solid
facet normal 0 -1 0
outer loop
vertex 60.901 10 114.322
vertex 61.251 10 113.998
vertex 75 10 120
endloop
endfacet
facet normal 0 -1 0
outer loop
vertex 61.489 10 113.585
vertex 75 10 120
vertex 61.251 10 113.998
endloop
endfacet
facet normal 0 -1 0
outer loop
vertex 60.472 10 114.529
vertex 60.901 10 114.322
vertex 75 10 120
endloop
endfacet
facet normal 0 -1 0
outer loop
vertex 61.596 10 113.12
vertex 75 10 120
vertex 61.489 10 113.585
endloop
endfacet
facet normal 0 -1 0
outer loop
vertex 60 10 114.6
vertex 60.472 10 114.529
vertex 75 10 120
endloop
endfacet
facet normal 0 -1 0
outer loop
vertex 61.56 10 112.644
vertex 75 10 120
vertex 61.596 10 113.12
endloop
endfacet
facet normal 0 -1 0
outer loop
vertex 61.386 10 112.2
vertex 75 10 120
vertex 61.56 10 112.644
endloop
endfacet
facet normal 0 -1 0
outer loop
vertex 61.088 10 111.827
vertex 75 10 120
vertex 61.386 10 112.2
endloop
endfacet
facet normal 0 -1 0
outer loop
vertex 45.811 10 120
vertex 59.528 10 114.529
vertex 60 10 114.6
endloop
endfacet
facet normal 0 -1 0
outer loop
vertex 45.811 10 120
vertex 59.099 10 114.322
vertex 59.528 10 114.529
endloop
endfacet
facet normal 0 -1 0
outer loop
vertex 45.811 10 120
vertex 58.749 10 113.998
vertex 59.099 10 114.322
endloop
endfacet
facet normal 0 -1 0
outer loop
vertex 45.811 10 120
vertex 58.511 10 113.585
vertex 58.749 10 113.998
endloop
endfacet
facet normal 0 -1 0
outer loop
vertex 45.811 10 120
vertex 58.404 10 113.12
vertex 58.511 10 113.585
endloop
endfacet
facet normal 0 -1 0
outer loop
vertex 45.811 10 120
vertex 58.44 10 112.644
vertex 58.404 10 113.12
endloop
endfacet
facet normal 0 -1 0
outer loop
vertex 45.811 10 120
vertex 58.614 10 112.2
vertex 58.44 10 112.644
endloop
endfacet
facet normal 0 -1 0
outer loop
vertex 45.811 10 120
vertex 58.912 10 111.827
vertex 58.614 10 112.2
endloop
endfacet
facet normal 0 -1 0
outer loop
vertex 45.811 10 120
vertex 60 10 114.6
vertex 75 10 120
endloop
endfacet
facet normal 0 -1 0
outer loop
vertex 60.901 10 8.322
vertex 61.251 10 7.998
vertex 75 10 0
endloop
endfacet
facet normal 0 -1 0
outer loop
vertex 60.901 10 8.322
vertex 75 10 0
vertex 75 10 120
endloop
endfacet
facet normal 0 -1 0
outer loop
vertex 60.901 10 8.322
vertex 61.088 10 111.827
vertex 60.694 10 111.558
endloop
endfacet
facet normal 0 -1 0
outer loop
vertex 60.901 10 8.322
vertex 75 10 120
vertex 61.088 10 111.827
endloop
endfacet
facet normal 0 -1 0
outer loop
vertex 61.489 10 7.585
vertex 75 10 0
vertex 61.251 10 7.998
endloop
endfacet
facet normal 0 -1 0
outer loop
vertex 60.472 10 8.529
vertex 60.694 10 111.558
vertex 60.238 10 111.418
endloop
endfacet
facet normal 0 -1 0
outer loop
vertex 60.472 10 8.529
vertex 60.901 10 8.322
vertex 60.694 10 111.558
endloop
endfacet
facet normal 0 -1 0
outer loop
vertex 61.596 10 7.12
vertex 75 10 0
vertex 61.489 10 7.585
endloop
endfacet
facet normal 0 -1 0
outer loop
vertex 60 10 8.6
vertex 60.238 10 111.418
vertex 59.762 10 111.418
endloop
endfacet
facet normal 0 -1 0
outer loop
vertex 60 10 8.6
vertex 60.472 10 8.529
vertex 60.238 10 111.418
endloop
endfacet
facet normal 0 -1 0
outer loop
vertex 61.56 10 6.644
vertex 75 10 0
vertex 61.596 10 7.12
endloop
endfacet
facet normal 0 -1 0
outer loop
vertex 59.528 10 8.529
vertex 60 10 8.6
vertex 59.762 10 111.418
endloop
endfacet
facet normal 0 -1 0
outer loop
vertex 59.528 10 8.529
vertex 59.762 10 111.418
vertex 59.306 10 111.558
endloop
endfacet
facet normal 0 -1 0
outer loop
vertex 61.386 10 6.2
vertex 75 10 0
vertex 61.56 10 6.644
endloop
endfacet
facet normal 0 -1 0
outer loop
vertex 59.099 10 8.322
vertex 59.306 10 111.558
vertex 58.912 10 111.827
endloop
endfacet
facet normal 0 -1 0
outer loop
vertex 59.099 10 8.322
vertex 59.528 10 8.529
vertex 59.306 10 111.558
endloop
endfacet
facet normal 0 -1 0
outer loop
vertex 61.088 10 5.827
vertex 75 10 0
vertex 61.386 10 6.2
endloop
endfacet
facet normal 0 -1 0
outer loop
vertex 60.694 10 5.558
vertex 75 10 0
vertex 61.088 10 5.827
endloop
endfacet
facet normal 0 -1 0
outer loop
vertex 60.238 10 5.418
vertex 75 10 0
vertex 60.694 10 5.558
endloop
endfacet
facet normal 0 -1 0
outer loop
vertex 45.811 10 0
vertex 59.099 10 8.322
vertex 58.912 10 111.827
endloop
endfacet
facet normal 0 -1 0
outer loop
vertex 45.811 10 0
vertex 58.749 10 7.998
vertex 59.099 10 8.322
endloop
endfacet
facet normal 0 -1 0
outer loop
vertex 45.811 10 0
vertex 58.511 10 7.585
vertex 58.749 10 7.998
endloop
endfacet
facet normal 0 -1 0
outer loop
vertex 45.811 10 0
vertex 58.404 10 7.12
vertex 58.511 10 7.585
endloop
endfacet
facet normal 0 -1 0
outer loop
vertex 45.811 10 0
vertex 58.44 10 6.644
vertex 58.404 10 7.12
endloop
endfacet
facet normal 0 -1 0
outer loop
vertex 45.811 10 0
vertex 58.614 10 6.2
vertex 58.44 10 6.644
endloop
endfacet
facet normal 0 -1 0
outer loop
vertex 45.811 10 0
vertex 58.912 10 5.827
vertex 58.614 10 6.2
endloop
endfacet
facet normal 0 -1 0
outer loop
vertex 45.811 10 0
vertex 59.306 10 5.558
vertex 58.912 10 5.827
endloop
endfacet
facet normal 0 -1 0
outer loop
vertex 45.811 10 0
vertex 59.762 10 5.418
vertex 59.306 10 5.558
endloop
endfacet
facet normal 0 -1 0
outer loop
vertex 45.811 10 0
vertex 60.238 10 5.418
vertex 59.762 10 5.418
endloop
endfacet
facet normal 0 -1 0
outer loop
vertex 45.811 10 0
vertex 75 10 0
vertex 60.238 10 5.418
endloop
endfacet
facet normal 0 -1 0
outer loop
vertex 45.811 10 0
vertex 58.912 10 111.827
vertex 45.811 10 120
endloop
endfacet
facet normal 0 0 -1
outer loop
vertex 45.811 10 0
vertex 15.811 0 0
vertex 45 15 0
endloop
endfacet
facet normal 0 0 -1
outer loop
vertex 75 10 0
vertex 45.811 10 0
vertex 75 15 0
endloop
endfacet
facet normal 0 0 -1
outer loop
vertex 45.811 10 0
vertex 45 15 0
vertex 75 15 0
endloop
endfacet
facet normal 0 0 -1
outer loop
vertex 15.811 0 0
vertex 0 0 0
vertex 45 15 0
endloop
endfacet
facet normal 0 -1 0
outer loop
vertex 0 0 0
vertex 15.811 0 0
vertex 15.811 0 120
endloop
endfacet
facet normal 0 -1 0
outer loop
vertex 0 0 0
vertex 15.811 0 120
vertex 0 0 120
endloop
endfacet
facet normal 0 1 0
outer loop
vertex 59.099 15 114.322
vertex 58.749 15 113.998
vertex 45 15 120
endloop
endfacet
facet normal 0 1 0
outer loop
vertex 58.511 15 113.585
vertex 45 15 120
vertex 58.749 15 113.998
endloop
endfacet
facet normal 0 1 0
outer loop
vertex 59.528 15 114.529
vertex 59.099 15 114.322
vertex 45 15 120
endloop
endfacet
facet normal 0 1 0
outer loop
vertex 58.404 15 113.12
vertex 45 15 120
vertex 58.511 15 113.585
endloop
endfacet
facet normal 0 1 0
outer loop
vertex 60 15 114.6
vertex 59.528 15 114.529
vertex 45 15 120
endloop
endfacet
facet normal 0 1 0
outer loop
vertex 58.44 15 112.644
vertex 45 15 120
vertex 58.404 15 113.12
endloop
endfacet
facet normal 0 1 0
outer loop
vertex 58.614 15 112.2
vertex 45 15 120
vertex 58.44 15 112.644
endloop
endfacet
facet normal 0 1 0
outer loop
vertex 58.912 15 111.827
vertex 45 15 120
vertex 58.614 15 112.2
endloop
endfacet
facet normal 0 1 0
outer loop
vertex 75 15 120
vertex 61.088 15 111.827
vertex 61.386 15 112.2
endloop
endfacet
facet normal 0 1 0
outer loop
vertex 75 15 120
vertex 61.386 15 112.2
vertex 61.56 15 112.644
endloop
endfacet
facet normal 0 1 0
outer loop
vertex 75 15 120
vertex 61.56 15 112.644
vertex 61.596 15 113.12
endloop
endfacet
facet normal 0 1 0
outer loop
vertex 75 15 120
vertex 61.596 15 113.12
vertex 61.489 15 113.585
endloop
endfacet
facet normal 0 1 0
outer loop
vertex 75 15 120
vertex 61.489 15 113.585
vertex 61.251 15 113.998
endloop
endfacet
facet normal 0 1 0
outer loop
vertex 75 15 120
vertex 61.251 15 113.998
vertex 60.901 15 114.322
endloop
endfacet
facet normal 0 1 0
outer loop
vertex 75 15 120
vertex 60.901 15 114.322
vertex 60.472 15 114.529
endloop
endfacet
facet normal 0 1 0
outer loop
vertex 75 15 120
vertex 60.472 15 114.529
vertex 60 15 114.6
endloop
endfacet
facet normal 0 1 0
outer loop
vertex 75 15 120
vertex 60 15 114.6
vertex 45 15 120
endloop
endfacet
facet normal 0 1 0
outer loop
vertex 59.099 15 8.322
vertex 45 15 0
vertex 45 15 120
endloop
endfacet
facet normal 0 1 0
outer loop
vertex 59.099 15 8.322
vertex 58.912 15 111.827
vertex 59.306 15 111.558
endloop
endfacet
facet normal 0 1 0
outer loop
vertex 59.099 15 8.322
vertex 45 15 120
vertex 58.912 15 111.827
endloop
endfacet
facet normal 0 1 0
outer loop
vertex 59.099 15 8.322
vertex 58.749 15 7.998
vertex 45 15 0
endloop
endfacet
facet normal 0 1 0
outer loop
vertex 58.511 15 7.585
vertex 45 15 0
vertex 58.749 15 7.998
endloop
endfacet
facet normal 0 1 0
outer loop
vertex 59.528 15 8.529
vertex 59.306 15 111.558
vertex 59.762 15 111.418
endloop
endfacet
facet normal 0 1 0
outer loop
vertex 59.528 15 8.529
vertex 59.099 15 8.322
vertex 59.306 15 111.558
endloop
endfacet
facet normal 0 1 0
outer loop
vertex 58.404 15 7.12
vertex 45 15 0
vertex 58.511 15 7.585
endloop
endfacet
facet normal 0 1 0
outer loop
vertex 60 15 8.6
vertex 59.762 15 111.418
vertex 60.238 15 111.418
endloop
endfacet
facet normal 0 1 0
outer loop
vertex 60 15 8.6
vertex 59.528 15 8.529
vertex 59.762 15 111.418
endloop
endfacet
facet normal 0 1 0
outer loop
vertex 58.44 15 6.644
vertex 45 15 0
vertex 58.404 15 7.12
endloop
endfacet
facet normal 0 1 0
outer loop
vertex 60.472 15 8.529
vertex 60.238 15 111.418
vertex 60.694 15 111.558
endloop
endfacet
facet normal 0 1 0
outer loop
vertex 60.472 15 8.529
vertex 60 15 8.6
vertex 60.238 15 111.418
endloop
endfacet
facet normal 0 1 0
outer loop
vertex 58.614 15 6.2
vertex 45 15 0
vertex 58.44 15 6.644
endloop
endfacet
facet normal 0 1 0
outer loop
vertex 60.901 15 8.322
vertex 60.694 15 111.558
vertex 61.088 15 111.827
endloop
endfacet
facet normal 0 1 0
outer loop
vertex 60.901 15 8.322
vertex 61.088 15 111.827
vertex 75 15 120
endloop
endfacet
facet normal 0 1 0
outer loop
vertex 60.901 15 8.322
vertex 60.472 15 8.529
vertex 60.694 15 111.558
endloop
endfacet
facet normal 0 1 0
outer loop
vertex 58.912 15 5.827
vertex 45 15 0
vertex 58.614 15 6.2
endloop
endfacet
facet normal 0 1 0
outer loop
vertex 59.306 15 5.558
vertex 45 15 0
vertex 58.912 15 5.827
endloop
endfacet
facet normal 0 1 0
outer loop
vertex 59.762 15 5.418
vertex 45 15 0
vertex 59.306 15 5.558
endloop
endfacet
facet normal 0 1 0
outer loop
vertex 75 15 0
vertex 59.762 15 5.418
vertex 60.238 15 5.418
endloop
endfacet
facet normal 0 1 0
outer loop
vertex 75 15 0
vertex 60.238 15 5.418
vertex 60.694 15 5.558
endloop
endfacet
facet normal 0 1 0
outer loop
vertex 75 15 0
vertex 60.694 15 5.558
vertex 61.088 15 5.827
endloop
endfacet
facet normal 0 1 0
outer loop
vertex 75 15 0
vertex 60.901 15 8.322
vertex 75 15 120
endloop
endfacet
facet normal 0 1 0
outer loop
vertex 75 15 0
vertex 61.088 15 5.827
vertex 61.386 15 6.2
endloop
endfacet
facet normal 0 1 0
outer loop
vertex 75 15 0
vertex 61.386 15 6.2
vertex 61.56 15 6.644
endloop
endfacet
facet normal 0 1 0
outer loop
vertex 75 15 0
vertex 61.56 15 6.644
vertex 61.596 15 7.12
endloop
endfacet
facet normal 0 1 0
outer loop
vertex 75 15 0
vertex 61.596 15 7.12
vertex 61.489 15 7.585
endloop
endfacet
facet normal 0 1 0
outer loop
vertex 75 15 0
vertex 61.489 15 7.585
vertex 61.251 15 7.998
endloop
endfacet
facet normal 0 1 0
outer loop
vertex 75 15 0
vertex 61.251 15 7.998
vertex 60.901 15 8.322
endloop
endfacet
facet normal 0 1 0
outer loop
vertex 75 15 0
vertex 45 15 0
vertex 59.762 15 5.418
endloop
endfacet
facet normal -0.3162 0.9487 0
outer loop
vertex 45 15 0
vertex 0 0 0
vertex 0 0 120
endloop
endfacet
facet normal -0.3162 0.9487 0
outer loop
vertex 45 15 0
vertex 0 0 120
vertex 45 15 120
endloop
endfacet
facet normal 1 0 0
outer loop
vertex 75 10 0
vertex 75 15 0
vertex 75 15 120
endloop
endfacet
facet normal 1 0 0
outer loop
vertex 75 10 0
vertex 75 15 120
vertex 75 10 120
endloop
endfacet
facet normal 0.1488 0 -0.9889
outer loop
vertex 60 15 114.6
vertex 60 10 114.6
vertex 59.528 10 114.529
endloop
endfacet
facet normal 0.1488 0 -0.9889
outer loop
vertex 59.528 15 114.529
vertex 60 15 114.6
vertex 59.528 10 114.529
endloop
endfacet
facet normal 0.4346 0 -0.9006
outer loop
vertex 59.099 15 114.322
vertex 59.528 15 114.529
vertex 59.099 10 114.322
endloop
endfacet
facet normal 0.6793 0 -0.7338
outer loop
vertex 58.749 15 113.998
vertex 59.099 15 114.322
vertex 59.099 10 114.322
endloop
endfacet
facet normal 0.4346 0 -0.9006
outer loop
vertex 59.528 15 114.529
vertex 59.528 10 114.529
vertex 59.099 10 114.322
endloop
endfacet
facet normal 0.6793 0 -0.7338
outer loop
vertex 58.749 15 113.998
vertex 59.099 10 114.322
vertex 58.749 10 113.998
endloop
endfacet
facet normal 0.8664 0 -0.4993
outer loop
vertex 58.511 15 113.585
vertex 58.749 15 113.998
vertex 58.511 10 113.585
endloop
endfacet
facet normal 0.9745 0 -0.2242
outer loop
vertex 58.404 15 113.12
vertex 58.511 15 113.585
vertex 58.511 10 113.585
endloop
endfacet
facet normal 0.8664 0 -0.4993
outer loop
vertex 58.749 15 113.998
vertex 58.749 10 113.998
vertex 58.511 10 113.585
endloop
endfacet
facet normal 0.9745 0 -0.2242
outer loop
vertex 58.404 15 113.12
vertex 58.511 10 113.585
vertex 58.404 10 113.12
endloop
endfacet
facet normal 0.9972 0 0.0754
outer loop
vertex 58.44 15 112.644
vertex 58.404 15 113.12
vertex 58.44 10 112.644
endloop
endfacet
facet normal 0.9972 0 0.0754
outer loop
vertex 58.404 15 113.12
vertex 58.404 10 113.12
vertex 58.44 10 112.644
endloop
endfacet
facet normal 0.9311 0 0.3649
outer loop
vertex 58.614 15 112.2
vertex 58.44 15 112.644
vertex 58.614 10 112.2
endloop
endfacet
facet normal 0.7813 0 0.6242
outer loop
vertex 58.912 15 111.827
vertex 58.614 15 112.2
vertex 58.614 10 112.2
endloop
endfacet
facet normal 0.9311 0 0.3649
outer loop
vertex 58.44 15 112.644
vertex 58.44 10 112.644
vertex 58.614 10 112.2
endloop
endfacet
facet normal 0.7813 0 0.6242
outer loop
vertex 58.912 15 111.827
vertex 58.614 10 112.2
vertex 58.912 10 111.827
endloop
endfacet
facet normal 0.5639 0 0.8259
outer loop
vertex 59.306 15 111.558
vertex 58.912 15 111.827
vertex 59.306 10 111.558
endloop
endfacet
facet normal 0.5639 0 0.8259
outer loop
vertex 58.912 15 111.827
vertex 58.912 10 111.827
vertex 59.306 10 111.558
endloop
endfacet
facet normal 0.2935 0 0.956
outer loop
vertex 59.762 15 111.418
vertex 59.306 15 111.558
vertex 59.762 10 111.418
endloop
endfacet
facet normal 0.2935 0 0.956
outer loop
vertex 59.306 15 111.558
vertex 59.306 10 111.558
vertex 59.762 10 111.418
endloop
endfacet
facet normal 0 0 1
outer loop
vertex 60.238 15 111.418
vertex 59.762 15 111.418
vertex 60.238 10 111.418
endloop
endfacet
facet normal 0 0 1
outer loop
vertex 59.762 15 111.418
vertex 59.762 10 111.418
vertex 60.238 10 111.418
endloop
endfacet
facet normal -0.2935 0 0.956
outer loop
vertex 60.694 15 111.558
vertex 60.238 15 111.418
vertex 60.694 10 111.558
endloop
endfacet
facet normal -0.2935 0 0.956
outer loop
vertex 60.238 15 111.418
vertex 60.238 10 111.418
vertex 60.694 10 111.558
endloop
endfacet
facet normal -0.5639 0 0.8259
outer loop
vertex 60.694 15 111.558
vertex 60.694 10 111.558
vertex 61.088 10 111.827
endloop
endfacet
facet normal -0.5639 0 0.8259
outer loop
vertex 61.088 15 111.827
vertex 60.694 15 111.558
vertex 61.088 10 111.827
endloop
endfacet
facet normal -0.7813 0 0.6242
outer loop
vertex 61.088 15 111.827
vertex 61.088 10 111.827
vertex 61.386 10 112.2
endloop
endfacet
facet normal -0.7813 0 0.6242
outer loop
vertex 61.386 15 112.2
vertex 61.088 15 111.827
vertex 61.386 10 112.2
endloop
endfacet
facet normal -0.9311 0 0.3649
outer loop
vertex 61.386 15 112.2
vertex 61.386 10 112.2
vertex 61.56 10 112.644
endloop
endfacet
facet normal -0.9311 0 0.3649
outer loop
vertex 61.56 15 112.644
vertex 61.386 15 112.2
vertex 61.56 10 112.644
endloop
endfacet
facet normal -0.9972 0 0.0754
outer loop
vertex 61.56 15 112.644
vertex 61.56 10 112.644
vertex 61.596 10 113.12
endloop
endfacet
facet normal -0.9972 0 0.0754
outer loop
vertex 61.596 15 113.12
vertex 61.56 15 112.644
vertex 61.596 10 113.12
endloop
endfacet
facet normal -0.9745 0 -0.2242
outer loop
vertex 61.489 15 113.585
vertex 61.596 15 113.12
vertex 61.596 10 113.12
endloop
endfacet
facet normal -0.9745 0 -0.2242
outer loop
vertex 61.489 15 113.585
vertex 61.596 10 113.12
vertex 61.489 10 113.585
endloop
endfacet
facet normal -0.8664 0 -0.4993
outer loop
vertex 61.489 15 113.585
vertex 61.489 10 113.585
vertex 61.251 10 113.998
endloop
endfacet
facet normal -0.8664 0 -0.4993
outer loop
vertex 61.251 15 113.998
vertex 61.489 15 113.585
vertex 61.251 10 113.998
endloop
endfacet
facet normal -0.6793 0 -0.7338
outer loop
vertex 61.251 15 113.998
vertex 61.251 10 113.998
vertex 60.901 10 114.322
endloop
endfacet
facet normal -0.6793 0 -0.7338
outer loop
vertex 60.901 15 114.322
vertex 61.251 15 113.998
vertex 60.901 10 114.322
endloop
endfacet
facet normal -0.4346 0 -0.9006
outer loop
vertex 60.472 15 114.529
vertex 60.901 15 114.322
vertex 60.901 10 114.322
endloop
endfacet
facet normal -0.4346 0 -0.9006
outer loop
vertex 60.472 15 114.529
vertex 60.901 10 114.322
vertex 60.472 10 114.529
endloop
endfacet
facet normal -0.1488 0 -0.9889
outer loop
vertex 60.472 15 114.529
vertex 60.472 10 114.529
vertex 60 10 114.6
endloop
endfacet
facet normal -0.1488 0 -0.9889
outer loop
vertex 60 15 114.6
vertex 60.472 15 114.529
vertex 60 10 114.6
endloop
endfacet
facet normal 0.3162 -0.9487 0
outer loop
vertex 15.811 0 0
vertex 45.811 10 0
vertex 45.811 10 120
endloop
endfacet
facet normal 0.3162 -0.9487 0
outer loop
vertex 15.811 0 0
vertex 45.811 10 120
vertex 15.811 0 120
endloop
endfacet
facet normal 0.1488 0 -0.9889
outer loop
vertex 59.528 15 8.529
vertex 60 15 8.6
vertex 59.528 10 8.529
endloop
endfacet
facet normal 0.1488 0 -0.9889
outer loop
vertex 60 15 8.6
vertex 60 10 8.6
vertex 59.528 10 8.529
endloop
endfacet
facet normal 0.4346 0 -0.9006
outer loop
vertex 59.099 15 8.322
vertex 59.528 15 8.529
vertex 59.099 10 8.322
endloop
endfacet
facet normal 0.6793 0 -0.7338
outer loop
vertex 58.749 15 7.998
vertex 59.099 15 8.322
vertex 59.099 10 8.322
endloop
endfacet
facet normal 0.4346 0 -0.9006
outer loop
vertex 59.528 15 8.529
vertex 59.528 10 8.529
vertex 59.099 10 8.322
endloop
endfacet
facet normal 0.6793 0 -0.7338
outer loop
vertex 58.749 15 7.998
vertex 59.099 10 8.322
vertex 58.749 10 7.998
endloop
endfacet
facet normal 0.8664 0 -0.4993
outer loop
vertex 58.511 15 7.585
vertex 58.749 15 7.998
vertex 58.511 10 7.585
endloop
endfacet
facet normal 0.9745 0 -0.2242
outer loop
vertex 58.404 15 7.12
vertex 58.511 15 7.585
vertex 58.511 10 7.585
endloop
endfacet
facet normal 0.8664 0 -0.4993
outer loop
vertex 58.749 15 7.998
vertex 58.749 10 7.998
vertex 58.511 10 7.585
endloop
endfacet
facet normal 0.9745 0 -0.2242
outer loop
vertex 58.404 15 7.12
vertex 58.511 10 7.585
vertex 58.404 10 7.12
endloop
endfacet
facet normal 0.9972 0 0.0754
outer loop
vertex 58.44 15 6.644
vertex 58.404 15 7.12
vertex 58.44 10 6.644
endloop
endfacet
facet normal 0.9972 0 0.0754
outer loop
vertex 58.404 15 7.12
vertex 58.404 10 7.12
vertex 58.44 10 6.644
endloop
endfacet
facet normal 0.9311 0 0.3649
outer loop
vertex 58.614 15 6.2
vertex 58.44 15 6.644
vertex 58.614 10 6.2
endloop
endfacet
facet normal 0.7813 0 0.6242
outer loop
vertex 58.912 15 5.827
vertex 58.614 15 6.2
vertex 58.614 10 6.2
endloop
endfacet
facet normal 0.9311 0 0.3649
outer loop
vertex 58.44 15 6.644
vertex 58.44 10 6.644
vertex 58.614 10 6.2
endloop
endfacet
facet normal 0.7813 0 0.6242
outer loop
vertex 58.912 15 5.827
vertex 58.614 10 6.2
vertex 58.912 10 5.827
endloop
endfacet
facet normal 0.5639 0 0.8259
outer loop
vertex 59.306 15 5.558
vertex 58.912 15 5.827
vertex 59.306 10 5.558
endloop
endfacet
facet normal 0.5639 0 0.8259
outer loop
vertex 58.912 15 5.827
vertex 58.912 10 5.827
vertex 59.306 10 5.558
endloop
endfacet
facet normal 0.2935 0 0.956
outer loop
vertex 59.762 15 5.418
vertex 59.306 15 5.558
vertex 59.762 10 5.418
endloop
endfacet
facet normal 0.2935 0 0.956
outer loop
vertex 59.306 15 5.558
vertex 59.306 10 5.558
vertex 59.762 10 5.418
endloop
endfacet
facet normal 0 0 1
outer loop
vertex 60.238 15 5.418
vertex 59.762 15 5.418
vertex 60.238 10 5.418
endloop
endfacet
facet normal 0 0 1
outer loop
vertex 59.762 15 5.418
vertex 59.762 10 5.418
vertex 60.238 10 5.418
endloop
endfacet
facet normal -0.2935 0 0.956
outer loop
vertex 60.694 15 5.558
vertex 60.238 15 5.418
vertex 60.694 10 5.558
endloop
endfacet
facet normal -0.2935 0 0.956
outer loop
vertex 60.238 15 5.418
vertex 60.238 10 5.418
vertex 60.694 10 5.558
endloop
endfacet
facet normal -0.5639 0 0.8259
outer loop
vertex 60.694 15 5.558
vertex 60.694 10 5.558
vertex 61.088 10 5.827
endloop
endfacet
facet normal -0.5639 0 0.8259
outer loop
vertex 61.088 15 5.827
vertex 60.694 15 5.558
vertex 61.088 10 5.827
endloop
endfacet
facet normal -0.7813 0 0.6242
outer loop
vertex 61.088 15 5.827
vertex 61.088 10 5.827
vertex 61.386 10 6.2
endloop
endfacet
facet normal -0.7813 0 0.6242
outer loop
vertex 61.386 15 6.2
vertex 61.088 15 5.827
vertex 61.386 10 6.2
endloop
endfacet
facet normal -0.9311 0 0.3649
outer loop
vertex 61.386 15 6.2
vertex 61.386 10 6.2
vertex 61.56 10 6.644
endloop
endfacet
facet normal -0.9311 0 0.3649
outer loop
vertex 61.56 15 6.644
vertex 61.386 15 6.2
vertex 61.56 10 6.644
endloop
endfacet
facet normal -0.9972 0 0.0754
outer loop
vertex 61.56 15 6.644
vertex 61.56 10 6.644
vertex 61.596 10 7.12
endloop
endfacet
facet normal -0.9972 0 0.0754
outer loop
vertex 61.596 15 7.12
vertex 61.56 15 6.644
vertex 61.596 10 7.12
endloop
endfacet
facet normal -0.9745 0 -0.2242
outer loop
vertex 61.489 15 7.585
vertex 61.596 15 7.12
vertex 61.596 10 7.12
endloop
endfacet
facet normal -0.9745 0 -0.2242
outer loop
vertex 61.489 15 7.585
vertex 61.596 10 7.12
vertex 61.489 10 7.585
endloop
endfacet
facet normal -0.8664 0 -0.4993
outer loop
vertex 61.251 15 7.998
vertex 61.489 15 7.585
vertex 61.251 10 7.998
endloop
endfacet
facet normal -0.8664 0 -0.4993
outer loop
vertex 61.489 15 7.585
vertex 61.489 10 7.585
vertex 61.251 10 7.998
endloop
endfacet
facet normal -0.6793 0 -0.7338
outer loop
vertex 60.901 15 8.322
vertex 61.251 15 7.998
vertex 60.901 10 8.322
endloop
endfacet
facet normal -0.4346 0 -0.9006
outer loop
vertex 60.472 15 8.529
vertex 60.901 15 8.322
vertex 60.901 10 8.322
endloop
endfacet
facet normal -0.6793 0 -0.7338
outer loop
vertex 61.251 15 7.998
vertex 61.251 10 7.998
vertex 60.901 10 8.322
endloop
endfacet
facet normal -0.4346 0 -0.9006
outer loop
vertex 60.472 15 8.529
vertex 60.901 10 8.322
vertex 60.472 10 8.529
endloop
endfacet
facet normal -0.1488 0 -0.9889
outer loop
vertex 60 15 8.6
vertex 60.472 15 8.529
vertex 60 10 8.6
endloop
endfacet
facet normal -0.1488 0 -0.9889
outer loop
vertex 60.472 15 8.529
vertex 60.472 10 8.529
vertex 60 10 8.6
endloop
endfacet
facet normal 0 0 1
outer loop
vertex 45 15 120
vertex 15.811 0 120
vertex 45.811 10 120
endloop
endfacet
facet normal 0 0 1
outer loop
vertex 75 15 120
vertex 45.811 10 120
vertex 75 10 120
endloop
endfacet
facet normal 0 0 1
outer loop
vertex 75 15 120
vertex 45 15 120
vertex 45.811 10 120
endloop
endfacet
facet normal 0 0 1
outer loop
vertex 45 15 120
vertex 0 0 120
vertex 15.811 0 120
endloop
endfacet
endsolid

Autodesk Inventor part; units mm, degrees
ref_plane "YZ Plane" through (0, 0, 0) normal (1, 0, 0) x (0, 1, 0)
ref_plane "XZ Plane" through (0, 0, 0) normal (0, 1, 0) x (-1, 0, 0)
ref_plane "XY Plane" through (0, 0, 0) normal (0, 0, 1) x (1, 0, 0)
sketch "スケッチ1" plane through (0, 0, 0) normal (0, 0, 1) x (1, 0, 0)
  line L0 (0, 0) -> (45, 15)
  line L1 (45, 15) -> (75, 15)
  line L2 (75, 15) -> (75, 10)
  line L3 (75, 10) -> (45.8114, 10)
  line L4 (45.8114, 10) -> (15.8114, 0)
  line L5 (15.8114, 0) -> (0, 0)
  dimension "d0" = 15
  dimension "d1" = 5
  dimension "d2" = 5
  dimension "d21" = 30
  dimension "d27" = 30
extrude "押し出し1" add sketch "スケッチ1" along normal blind 120
sketch "スケッチ3" plane through (45, 15, 0) normal (0, 1, 0) x (1, 0, 0)
  line L0 (30, 0) -> (30, -120) projected
  line L1 (30, 0) -> (0, 0) projected
  line L2 (30, -120) -> (0, -120) projected
  point P0 (-45, 0)
  point P1 (15, -7)
  point P2 (30, -80)
  point P3 (15, -113)
  point P4 (15, -120)
  dimension "d12" = 15
  dimension "d13" = 7
  dimension "d23" = 106
hole "穴1" at (60, 15, 7) at (60, 15, 113) direction (0, -1, 0) diameter 3.2 depth 10 tip angle 118
properties part number "排出スロープ"
